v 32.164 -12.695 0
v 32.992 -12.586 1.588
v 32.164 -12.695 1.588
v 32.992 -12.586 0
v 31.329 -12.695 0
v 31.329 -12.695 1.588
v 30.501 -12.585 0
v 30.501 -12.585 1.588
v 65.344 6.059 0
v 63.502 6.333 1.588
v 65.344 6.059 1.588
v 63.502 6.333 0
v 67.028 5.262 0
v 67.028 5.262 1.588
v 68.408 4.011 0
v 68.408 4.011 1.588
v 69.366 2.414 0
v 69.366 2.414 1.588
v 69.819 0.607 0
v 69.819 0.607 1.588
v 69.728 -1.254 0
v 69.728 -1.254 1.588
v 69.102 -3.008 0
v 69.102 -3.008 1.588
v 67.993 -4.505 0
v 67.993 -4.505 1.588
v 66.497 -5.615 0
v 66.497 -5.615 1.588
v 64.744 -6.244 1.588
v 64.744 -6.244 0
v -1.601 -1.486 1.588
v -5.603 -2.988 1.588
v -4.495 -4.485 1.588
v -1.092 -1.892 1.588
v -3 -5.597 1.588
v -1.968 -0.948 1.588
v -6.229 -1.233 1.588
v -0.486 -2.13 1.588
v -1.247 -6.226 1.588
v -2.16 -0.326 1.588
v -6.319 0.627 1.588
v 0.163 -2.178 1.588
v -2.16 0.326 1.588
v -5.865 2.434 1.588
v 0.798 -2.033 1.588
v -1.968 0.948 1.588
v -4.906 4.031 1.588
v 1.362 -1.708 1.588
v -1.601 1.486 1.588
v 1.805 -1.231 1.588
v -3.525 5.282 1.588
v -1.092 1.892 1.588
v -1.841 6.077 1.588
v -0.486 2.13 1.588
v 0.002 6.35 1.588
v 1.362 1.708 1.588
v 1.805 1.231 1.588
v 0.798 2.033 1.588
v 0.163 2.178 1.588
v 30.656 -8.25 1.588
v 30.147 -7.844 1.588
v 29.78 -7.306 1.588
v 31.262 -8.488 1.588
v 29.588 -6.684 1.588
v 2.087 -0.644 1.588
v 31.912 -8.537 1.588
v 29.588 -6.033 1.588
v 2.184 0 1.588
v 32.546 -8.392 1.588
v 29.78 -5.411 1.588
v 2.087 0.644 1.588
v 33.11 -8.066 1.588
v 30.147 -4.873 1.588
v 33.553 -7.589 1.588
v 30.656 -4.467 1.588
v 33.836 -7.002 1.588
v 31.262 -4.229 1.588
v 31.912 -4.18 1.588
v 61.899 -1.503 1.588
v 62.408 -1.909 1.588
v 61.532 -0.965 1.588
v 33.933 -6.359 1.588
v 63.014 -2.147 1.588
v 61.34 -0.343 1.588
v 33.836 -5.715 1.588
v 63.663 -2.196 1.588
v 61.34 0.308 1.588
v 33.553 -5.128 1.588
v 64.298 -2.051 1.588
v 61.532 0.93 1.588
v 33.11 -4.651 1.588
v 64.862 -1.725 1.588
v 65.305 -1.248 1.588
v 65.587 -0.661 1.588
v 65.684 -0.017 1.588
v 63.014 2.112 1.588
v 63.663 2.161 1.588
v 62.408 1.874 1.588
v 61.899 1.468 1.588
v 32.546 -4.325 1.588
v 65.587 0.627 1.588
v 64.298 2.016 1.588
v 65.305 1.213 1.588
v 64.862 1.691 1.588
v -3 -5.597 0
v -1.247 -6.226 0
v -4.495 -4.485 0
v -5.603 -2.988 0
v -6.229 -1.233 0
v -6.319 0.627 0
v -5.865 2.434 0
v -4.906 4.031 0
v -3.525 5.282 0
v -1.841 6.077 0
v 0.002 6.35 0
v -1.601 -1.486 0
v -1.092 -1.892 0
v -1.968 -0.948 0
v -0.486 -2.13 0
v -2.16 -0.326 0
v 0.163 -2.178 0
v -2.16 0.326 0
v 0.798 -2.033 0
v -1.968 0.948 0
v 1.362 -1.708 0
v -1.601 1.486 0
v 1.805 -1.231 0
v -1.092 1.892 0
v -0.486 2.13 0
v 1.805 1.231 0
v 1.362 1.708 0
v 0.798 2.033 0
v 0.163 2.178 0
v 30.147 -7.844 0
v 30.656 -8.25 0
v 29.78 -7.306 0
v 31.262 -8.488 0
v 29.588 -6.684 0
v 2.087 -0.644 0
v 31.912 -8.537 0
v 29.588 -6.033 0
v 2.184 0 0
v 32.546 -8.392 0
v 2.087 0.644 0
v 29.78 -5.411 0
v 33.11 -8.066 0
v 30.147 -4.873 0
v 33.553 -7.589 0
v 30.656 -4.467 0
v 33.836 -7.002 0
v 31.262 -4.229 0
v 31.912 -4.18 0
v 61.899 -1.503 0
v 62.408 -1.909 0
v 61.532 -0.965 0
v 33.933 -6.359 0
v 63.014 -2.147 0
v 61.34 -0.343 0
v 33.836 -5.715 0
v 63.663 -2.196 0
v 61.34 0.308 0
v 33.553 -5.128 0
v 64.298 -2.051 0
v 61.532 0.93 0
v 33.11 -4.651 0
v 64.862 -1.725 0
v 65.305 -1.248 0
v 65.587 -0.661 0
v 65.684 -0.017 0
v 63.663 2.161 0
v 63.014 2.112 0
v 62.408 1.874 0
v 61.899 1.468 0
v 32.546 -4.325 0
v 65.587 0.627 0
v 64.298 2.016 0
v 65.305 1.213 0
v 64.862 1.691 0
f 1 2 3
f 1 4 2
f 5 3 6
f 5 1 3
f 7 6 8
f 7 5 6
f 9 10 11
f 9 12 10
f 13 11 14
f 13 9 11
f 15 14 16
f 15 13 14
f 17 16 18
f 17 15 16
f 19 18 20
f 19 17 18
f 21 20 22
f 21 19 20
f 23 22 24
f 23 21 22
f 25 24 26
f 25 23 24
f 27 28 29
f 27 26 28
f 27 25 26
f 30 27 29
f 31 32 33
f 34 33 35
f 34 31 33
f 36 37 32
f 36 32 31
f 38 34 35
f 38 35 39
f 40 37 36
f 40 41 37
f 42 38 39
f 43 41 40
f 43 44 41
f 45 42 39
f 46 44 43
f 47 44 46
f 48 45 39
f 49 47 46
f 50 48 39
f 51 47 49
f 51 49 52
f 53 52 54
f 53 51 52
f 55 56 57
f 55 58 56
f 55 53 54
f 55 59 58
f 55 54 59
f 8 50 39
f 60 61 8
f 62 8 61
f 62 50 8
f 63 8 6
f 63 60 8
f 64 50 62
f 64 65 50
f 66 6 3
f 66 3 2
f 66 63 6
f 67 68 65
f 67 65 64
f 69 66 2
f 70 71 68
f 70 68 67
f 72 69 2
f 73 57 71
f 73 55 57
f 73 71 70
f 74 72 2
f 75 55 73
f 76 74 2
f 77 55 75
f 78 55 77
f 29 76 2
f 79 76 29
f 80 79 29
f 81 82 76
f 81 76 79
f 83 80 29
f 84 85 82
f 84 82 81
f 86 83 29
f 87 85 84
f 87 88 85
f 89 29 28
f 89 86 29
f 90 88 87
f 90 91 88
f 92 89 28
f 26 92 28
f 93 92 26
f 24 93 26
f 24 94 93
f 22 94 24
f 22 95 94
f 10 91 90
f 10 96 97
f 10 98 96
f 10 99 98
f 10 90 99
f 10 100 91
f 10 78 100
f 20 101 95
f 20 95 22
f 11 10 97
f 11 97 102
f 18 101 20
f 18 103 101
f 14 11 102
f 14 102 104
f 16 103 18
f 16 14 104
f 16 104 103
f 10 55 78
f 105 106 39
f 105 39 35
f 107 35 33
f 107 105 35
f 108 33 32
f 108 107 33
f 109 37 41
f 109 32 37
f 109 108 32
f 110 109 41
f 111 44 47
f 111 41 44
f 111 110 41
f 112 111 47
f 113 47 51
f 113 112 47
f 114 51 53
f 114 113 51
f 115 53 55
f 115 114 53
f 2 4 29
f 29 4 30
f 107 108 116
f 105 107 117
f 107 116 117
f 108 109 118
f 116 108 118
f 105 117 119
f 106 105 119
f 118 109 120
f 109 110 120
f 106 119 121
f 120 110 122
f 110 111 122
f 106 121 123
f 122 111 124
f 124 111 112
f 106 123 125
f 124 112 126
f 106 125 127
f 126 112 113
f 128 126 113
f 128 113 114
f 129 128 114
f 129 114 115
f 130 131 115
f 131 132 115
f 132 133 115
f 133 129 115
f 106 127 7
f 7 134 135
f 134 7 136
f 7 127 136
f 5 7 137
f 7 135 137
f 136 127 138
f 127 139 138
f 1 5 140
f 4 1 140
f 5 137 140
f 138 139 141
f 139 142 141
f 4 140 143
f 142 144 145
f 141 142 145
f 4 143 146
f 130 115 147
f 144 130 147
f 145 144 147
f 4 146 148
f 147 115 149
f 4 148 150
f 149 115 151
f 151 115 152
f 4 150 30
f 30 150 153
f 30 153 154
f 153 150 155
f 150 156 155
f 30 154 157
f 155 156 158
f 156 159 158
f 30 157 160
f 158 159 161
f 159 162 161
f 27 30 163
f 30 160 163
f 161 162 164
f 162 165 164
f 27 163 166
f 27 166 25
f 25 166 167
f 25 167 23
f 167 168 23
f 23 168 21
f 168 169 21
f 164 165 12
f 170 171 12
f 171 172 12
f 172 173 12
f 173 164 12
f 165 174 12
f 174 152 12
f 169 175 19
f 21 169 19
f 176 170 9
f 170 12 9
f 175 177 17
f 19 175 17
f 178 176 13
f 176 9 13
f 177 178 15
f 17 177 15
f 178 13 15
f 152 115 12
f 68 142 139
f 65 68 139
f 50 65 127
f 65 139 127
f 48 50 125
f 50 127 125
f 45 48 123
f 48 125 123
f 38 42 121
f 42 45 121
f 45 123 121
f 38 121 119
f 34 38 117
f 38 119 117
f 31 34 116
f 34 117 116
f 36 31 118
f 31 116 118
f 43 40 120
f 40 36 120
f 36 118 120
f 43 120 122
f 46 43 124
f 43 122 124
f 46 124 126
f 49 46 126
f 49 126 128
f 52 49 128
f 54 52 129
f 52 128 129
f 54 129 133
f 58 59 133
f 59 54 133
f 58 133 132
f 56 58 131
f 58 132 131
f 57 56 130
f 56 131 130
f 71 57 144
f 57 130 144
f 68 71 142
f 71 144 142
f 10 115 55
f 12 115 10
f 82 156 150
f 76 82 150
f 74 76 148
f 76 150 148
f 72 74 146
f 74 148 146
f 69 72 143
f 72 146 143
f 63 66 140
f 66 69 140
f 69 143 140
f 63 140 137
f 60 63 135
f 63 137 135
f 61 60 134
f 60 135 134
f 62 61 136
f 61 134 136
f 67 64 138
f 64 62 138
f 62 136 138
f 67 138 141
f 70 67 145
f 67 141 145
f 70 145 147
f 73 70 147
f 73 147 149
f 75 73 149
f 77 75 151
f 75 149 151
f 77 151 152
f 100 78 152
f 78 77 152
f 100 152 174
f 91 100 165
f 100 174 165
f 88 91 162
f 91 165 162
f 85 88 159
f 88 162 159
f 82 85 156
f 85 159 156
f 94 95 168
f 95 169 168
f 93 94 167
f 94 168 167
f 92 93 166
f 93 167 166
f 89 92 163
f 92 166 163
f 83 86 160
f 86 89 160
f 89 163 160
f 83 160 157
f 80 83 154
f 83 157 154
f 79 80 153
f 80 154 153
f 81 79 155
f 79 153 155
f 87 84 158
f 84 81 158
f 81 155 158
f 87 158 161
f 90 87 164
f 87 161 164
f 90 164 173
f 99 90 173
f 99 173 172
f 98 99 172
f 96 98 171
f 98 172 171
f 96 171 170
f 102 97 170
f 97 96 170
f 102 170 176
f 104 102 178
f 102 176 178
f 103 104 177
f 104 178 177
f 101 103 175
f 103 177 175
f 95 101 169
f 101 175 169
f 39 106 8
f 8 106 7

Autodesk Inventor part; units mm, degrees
ref_plane "YZ Plane" through (0, 0, 0) normal (1, 0, 0) x (0, 1, 0)
ref_plane "XZ Plane" through (0, 0, 0) normal (0, 1, 0) x (-1, 0, 0)
ref_plane "XY Plane" through (0, 0, 0) normal (0, 0, 1) x (1, 0, 0)
sketch "main" plane through (0, 0, 0) normal (0, 0, 1) x (1, 0, 0)
  circle A0 centre (5.5393, 31.9986) radius 2.1844
  circle A1 centre (5.5393, -31.5014) radius 2.1844
  arc A2 (11.8893, 31.9986) -> (-0.6874, 33.244) centre (5.5393, 31.9986) ccw
  arc A3 (-0.6874, -32.7467) -> (11.8893, -31.5014) centre (5.5393, -31.5014) ccw
  line L0 (11.8893, 31.9986) -> (11.8893, -31.5014)
  circle A4 centre (-0.8107, 0.2486) radius 2.1844
  arc A5 (-7.0374, 1.494) -> (-7.0374, -0.9967) centre (-0.8107, 0.2486) ccw
  line L1 (-0.6874, 33.244) -> (-7.0374, 1.494)
  line L2 (-7.0374, -0.9967) -> (-0.6874, -32.7467)
  point P0 (2.0663, 0.2486)
sketch "Sketch1" plane through (0, 0, 0) normal (0, 0, 1) x (1, 0, 0)
  circle A0 centre (0, 0) radius 2.1844
  circle A1 centre (63.5, -0.0173) radius 2.1844
  arc A2 (0.0017, 6.35) -> (-1.247, -6.2263) centre (0, 0) ccw
  arc A3 (64.7436, -6.2443) -> (63.5017, 6.3327) centre (63.5, -0.0173) ccw
  line L0 (0.0017, 6.35) -> (63.5017, 6.3327)
  circle A4 centre (31.7483, -6.3586) radius 2.1844
  arc A5 (30.5012, -12.585) -> (32.9919, -12.5857) centre (31.7483, -6.3586) ccw
  line L1 (-1.247, -6.2263) -> (30.5012, -12.585)
  line L2 (32.9919, -12.5857) -> (64.7436, -6.2443)
  point P0 (0, 0)
extrude "Extrusion1" add sketch "Sketch1" along normal blind 1.5875
properties part number "gearbox_gusset" material "Acetal Resin, White"
